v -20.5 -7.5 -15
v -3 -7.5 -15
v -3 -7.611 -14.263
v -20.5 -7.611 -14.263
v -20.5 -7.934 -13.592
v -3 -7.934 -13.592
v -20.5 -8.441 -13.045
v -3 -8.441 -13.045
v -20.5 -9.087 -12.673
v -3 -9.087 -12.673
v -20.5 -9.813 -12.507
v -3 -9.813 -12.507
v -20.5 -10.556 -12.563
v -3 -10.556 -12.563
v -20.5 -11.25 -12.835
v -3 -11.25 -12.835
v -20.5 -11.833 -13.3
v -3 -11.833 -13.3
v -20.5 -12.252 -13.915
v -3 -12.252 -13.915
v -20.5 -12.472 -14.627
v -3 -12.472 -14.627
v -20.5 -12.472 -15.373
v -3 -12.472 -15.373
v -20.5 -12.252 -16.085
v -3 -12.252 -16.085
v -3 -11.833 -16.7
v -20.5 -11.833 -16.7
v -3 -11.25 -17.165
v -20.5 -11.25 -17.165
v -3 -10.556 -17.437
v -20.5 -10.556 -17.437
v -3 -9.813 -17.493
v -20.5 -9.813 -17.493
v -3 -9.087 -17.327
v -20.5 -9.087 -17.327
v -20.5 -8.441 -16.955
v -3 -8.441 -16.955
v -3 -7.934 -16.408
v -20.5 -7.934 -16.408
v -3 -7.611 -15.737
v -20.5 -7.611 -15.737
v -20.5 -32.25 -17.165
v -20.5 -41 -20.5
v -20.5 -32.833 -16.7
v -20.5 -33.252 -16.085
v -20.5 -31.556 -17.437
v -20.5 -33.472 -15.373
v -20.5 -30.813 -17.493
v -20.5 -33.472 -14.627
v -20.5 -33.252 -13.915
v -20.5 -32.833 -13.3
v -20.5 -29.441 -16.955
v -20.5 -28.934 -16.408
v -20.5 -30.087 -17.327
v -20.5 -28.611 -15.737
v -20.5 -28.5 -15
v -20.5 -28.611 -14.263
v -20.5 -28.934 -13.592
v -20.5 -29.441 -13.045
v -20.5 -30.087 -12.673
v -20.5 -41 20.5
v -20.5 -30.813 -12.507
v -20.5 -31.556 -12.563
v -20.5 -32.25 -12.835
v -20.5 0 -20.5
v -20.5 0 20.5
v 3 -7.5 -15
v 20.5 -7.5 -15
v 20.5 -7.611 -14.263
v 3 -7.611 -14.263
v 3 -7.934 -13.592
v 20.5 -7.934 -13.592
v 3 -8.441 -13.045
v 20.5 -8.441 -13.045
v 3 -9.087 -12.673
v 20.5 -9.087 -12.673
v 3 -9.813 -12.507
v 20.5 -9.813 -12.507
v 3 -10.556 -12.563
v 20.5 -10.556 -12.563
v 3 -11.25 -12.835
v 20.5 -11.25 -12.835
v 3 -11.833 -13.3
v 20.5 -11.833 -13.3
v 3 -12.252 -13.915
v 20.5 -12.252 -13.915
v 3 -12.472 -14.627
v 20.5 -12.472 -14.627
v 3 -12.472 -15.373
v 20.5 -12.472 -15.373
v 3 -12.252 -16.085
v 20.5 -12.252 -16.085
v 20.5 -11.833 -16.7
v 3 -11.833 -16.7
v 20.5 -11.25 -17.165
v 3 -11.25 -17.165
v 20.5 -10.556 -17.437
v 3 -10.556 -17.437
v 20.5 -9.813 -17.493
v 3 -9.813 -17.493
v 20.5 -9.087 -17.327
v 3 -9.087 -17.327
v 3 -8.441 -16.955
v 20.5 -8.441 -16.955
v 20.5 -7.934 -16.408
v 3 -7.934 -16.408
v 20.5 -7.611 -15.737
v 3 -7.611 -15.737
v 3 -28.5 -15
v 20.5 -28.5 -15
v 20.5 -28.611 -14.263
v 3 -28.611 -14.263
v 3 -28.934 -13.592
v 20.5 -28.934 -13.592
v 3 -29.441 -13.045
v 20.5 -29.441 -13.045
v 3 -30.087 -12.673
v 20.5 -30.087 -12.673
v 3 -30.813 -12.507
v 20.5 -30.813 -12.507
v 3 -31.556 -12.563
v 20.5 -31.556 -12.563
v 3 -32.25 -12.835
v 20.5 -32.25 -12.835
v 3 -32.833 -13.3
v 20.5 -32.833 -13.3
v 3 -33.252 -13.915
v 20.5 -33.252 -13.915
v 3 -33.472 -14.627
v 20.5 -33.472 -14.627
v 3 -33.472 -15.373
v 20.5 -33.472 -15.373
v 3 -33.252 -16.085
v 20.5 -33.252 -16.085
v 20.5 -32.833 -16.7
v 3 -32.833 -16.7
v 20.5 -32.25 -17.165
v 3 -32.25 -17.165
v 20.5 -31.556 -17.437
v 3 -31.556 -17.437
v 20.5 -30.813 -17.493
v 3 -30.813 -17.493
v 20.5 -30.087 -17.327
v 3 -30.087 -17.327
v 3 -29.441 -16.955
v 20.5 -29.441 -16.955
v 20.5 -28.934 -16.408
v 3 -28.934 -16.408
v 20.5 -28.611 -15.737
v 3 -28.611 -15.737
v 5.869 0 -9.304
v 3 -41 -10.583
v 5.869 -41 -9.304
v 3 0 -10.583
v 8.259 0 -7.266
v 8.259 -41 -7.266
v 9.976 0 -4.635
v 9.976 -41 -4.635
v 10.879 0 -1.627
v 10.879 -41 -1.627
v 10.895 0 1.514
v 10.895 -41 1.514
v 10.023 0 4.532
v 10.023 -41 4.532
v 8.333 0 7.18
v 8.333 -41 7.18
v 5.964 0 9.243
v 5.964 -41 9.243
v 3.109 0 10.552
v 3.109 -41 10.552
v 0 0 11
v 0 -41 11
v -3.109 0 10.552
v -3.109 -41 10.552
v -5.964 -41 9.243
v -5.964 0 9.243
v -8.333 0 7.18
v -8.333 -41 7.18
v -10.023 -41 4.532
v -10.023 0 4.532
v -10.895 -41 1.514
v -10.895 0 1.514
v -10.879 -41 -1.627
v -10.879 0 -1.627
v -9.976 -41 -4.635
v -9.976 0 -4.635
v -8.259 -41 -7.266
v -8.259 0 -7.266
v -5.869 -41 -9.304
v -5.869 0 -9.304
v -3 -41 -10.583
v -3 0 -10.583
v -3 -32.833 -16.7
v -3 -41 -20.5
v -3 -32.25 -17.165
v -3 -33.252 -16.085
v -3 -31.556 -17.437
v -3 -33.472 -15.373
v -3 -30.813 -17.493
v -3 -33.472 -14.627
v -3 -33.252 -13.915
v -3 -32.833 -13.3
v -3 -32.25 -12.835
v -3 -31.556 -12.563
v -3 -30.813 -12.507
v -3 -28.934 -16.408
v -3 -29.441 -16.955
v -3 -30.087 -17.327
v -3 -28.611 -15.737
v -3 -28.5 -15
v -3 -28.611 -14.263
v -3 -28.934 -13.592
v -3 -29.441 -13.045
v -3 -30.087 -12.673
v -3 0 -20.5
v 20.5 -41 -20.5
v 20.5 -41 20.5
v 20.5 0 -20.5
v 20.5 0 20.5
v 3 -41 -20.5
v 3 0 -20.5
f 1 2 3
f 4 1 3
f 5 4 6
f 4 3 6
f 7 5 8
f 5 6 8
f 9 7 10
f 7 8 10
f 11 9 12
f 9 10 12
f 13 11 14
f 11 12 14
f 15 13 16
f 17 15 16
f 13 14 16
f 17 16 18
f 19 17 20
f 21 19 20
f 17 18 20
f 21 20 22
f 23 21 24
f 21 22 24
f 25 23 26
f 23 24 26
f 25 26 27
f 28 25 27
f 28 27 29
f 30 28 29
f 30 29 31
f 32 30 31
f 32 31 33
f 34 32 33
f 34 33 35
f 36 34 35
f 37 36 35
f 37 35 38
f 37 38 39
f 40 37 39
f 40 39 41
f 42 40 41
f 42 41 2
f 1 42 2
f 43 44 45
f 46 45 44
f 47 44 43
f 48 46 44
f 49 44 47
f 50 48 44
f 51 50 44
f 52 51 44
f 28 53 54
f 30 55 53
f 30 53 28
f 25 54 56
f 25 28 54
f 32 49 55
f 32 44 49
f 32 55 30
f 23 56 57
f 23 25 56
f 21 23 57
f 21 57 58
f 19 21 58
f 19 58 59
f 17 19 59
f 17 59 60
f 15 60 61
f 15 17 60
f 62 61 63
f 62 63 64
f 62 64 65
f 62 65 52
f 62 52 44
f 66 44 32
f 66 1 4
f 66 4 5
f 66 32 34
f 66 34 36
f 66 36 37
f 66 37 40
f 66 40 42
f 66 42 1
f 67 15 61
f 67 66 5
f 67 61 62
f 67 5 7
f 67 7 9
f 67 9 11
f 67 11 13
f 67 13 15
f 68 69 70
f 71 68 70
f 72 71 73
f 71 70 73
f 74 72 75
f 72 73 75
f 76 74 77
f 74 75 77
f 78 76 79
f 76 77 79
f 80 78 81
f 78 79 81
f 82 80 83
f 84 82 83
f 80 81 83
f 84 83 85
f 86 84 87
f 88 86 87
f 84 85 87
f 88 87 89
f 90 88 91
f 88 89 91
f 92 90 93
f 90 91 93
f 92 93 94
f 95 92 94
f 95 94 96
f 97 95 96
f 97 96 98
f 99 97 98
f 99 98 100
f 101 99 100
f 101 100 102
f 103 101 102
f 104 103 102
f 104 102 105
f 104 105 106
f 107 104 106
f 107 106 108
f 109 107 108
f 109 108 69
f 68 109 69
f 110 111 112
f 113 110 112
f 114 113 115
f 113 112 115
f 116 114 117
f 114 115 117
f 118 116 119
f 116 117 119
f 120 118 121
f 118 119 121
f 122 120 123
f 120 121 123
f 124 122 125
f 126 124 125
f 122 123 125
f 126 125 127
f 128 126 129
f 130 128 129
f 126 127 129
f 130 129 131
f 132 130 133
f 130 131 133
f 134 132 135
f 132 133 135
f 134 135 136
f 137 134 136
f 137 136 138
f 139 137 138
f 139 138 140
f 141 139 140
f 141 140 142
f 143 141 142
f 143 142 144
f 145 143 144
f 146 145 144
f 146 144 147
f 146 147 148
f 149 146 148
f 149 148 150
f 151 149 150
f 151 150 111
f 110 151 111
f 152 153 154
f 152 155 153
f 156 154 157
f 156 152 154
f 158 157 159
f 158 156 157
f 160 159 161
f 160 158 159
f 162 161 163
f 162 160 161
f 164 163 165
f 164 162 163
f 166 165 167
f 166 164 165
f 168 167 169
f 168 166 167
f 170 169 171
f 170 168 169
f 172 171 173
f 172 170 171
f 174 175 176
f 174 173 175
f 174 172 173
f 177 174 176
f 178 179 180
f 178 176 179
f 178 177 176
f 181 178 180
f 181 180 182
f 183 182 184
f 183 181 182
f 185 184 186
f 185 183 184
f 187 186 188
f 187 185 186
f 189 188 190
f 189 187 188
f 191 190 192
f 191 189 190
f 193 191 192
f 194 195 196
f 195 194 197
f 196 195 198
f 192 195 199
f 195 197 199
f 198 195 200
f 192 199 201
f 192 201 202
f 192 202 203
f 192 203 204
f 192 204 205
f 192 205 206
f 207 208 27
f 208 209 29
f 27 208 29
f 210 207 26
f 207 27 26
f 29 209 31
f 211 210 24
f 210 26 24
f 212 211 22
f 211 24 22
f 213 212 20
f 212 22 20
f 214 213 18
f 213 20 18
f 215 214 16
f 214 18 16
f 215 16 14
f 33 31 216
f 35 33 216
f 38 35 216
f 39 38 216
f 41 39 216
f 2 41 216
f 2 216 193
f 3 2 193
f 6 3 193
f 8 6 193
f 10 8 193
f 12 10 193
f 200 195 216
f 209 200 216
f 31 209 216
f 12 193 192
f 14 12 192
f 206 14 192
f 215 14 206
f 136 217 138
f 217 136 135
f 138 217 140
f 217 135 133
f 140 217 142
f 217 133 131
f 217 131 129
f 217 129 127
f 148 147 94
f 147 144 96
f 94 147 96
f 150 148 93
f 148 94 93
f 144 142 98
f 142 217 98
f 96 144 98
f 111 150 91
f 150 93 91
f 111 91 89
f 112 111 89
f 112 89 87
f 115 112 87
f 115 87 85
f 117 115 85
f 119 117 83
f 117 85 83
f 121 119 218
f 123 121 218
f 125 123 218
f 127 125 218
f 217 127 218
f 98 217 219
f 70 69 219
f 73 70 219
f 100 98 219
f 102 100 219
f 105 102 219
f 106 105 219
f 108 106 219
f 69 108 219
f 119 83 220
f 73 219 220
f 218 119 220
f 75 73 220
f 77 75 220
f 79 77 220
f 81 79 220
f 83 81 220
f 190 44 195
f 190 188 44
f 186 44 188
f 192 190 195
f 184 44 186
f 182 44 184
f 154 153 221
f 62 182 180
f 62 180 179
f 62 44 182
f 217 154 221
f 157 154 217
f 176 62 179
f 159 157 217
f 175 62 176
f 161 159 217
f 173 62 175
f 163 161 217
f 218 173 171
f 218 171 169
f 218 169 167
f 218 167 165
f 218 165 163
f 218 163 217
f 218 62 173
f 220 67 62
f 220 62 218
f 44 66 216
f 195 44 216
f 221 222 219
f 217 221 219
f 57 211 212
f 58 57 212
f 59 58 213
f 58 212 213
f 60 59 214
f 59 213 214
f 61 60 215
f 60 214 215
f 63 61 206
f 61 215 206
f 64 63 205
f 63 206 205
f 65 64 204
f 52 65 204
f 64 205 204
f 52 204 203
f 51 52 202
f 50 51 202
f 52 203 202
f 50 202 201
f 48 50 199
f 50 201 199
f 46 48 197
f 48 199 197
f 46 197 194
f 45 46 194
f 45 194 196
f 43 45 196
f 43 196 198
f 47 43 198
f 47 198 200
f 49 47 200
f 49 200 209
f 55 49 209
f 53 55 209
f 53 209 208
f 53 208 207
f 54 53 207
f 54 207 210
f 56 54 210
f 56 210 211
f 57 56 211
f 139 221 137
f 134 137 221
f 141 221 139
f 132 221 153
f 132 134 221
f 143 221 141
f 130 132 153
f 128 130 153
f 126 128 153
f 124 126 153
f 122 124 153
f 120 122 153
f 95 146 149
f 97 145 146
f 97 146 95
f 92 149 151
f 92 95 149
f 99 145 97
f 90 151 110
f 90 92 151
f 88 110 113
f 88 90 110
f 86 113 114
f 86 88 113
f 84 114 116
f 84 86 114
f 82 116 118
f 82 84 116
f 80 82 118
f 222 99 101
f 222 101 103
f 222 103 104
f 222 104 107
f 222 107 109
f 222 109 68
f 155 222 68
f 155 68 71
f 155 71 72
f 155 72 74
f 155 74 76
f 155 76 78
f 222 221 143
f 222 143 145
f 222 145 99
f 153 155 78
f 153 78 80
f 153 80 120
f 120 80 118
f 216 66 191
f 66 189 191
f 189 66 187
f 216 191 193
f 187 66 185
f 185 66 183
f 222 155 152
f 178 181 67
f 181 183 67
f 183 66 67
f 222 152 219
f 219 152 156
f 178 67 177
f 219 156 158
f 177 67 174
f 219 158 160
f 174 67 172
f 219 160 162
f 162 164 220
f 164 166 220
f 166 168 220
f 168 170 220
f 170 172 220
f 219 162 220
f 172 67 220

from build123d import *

# Parameters (mm, degrees)
F0_W     = 41
F0_H     = 41
F0_R     = 11
F1_DEPTH = 41
F2_W     = 6
F2_H     = 11.5
F3_DEPTH = 41.001
F4_R     = 2.5
F5_DEPTH = 41.001


# Not quite as in the source:
# - a feature names something its author has since deleted; it is built from what else it names


with BuildPart() as f1:
    # F0 (on Front) → F1 (new body)
    with BuildSketch(Plane.XZ):
        Rectangle(F0_W, F0_H)
        Circle(F0_R, mode=Mode.SUBTRACT)
    extrude(amount=F1_DEPTH)

    # F2 (on Front) → F3 (cut, through all)
    with BuildSketch(Plane.XZ):
        with Locations((0, -14.9551387876)):
            Rectangle(F2_W, F2_H)
    extrude(amount=F3_DEPTH, mode=Mode.SUBTRACT)

    # F4 (on face) → F5 (cut, through all)
    with BuildSketch(Plane.YZ.offset(20.5)):
        with Locations((-31, -15)):
            Circle(F4_R)
        with Locations((-10, -15)):
            Circle(F4_R)
    extrude(amount=-F5_DEPTH, mode=Mode.SUBTRACT)


solid = f1.part
